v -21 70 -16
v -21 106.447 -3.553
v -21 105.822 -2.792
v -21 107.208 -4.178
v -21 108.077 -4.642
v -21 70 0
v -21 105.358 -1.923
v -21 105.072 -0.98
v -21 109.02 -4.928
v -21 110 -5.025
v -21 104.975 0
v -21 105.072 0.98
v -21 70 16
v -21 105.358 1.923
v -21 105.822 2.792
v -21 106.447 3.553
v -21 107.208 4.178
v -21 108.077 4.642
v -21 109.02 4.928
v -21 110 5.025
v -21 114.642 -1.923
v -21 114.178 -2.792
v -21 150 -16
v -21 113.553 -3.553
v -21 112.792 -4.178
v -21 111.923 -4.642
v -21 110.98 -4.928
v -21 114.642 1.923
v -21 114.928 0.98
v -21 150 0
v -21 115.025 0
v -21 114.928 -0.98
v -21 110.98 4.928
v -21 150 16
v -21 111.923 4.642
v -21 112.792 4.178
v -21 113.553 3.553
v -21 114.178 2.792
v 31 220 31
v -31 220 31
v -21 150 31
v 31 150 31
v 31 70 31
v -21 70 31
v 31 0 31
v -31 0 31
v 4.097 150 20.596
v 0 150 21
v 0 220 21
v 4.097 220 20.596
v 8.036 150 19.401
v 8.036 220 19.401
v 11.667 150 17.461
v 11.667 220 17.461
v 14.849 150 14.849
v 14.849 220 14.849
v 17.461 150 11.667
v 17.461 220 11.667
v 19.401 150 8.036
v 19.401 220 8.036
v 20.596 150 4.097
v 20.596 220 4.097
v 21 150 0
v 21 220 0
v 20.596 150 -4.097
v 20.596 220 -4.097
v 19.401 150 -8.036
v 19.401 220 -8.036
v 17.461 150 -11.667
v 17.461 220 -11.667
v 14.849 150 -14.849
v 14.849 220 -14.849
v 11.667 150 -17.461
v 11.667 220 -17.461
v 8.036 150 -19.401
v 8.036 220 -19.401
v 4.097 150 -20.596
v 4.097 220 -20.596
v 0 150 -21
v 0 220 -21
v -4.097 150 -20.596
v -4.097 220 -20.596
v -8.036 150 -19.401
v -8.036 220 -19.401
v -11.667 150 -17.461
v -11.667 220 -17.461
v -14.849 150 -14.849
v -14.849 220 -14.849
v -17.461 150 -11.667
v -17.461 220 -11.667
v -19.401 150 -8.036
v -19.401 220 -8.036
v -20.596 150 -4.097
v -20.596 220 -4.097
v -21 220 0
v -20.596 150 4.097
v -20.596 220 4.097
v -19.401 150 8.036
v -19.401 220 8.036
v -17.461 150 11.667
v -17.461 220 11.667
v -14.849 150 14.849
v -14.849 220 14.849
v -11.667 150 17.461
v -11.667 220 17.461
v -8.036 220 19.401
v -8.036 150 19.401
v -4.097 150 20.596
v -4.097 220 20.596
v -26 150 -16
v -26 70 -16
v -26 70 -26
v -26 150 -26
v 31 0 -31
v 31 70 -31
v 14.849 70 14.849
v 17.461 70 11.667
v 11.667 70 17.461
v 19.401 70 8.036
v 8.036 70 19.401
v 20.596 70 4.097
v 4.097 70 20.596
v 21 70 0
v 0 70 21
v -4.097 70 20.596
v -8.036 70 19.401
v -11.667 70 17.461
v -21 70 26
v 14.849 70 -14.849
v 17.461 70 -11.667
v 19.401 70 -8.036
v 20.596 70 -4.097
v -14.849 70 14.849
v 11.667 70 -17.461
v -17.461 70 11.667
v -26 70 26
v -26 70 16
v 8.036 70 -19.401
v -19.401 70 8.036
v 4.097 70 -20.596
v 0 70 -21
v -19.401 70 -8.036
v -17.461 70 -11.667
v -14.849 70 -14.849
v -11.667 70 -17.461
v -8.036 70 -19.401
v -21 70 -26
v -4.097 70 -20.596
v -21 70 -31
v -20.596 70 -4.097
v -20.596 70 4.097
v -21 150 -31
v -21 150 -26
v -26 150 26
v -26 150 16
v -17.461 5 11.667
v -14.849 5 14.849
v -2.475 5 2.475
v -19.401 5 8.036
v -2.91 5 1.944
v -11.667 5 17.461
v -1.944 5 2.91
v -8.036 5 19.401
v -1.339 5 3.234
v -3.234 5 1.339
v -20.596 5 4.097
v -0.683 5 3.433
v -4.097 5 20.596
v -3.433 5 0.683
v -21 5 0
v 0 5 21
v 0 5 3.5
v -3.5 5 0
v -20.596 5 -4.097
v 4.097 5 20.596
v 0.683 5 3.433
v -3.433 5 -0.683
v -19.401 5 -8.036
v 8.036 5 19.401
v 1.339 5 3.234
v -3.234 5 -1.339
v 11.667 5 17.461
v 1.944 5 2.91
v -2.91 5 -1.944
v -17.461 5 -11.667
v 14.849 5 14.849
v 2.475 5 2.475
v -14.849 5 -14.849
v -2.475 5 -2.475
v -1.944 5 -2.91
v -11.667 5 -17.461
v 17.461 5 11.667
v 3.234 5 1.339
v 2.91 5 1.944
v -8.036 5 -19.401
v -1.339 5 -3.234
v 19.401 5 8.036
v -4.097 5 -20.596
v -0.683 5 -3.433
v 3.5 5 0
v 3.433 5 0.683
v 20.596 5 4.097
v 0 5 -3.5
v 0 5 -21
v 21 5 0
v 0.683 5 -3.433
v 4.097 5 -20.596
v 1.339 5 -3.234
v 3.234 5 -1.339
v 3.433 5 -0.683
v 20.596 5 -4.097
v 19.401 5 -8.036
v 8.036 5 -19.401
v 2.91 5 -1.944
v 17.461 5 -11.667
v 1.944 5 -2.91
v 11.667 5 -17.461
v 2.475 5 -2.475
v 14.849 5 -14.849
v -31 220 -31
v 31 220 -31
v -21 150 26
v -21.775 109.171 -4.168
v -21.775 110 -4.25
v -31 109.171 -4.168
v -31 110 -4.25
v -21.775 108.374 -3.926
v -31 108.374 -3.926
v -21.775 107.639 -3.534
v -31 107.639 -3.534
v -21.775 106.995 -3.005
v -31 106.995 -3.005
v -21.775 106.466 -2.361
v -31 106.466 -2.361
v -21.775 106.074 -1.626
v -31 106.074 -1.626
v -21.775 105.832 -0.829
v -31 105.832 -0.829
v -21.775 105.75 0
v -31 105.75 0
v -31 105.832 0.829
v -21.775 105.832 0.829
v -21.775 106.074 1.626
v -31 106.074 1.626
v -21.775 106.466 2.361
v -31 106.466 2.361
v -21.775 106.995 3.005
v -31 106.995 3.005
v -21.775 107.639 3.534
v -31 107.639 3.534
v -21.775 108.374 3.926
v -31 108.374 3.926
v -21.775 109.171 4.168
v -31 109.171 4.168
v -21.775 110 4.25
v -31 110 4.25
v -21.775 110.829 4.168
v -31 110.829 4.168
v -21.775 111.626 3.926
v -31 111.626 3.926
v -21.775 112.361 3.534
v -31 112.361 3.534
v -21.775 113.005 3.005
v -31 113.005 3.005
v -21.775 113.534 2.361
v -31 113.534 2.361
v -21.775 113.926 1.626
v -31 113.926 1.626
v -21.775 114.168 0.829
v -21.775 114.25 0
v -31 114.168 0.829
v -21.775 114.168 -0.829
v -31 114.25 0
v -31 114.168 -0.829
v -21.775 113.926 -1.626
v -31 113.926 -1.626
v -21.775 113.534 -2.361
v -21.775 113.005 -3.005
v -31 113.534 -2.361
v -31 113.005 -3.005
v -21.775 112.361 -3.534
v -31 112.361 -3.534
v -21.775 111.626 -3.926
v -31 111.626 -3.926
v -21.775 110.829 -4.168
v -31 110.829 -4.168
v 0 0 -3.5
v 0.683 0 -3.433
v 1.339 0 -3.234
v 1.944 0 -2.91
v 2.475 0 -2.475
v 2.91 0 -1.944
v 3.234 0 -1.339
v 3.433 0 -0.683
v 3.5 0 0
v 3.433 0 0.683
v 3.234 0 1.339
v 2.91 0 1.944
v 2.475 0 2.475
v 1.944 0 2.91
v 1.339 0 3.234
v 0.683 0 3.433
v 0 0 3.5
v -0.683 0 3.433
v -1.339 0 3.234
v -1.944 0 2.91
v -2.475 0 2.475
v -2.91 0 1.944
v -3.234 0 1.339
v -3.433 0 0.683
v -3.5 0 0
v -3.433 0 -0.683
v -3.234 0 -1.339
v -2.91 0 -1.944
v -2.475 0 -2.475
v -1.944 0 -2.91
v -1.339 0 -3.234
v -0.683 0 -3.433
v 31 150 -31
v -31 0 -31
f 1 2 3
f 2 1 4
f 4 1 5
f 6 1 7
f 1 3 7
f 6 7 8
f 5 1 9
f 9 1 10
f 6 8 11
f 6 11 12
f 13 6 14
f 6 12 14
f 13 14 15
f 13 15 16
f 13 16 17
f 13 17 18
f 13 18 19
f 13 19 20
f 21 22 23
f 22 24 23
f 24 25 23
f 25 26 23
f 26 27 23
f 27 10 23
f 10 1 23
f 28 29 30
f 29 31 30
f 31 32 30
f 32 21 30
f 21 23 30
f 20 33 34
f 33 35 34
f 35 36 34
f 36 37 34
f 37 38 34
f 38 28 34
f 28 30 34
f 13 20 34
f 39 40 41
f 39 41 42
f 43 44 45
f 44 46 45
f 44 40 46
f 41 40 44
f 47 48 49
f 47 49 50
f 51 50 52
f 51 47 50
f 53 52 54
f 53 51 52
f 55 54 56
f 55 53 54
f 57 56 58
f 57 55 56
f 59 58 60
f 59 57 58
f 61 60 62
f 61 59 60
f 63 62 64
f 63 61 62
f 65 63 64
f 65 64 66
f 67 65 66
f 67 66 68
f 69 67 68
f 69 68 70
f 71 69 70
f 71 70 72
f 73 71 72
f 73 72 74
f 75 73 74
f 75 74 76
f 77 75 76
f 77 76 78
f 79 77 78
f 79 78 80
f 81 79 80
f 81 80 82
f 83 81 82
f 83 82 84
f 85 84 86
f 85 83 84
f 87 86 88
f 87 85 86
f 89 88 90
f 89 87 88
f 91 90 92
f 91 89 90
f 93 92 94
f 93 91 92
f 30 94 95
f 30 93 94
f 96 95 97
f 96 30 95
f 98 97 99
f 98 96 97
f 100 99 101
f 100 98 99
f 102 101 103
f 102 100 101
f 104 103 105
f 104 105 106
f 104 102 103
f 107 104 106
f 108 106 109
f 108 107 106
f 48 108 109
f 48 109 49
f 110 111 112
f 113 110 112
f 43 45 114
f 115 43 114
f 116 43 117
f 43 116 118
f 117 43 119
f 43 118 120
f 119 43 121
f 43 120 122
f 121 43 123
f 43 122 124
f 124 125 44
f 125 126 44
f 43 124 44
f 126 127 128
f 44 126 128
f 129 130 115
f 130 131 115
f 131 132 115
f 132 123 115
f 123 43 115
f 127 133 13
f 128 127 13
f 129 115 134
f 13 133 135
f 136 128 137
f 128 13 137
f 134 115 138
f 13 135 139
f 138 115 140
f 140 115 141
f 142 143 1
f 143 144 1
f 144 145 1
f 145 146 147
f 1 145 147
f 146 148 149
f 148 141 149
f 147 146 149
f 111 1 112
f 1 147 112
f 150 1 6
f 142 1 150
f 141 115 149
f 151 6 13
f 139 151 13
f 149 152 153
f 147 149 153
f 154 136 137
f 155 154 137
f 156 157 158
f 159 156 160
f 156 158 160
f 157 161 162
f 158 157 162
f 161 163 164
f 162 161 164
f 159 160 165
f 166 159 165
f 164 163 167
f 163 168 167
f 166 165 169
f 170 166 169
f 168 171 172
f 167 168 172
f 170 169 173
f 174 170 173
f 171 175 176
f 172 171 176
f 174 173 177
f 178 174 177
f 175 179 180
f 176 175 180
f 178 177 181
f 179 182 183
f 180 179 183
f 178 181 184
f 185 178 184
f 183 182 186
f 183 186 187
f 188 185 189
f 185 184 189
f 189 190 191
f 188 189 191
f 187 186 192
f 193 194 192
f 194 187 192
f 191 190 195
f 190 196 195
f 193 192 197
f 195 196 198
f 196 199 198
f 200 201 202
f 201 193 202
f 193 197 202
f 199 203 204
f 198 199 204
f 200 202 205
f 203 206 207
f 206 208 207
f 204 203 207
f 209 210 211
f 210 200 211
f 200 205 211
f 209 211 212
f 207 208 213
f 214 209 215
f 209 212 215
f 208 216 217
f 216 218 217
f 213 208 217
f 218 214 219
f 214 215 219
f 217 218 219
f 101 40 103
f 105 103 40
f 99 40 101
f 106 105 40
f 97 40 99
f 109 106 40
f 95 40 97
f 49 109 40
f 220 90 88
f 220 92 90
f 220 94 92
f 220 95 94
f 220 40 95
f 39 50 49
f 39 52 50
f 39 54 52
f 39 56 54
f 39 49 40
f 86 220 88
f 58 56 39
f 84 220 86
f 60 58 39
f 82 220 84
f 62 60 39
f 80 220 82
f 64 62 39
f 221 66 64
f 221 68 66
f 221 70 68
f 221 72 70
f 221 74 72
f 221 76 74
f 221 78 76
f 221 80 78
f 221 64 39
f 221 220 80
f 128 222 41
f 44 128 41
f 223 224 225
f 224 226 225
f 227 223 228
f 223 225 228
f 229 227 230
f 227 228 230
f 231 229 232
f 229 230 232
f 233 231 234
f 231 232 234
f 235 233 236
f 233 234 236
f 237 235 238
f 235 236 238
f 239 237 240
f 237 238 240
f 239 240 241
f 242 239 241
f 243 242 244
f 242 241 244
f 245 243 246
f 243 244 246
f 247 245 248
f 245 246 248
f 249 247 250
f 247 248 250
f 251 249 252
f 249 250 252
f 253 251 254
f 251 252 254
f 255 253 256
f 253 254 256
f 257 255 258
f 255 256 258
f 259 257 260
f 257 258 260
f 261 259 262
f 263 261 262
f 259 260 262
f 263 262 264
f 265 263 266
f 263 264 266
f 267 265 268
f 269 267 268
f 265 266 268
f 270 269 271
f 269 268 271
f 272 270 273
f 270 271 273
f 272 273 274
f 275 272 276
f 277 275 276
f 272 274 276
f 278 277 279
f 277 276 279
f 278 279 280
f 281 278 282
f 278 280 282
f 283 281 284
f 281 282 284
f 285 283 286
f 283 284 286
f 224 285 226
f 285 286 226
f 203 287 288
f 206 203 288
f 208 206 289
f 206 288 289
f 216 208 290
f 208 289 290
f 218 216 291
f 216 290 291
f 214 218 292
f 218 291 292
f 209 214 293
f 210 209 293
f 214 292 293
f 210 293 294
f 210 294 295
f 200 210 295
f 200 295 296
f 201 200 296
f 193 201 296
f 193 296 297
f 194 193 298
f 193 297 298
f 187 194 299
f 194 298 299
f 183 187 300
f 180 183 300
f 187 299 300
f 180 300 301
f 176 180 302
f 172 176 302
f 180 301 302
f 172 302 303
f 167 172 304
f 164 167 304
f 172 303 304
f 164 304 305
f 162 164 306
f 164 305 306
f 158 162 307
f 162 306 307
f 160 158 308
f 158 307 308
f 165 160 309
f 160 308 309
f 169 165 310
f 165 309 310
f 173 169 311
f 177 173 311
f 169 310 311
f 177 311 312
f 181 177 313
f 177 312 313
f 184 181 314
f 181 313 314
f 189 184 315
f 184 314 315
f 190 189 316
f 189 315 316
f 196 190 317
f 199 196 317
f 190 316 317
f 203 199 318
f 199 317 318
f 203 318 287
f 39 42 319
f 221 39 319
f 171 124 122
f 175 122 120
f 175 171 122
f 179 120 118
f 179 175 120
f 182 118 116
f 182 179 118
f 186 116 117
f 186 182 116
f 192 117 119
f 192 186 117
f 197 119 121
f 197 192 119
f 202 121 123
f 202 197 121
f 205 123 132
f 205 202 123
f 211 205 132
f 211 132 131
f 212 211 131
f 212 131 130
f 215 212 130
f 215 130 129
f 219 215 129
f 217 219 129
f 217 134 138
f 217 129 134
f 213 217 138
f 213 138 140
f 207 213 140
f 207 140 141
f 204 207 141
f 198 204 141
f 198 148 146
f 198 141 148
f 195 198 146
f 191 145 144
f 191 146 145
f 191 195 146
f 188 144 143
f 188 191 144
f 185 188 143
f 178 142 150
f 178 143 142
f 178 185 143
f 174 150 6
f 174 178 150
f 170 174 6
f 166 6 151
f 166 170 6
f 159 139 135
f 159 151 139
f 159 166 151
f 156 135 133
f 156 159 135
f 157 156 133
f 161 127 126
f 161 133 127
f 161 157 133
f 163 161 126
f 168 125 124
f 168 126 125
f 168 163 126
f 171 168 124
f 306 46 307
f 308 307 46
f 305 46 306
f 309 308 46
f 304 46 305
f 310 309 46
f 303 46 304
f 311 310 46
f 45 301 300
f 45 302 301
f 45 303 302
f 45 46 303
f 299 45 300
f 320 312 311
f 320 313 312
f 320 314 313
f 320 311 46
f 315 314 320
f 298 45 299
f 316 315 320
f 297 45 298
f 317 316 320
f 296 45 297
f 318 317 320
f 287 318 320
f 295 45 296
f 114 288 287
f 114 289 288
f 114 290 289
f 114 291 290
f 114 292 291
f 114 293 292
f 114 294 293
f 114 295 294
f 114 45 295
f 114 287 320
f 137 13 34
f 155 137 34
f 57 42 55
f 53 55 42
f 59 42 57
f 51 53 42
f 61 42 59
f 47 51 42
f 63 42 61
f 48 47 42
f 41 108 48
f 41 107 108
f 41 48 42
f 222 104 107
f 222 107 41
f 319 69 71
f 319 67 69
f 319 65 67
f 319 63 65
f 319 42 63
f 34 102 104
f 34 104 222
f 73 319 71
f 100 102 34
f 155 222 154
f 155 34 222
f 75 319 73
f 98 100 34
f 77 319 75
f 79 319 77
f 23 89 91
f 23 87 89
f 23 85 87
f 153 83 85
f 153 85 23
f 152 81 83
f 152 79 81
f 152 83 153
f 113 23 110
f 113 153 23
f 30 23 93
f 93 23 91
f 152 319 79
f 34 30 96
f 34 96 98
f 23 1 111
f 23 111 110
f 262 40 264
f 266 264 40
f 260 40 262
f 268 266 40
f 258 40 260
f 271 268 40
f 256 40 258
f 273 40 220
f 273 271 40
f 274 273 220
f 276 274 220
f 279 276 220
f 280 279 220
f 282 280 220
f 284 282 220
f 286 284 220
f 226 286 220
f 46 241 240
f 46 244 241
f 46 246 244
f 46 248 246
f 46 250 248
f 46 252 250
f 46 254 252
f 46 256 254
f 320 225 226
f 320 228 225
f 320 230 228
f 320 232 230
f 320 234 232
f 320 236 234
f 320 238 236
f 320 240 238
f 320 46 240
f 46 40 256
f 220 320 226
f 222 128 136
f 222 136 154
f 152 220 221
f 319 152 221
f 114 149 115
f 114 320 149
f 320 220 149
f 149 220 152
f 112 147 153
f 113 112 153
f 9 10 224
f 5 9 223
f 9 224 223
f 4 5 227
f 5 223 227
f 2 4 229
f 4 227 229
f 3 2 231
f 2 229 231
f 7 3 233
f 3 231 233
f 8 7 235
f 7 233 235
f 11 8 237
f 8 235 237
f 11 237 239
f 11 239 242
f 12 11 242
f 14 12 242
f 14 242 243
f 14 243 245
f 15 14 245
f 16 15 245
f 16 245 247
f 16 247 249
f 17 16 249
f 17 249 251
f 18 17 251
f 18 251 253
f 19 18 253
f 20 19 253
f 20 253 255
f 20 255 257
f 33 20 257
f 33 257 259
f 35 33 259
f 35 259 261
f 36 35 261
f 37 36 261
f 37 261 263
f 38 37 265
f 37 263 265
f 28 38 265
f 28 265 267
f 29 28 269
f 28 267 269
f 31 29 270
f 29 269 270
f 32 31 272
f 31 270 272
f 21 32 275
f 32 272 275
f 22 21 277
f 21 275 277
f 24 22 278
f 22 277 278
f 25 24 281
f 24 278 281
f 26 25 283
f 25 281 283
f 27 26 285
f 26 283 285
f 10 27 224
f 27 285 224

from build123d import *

# Parameters (mm, degrees)
SKETCH_2_W                    = 62
SKETCH_2_H                    = 62
SKETCH_2_R                    = 21
EXTRUDE_2_DEPTH               = 220
SKETCH_4_R                    = 21
SKETCH_4_R_2                  = 3.5
EXTRUDE_3_DEPTH               = 5
CUT_EXTRUDE_1_DEPTH           = 40
HOLE_WIZARD_M10_1_D           = 8.5
HOLE_WIZARD_M10_1_CSINK_D     = 10.05
HOLE_WIZARD_M10_1_CSINK_ANGLE = 90
SKETCH_7_W                    = 10
SKETCH_7_H                    = 80
CUT_EXTRUDE_2_DEPTH           = 5
SKETCH_10_W                   = 10
SKETCH_10_H                   = 80
CUT_EXTRUDE_3_DEPTH           = 5


with BuildPart() as part:
    # 草图2 → 凸台-拉伸2 (new body)
    with BuildSketch(Plane(origin=(0, 0, 0), x_dir=(1, 0, 0), z_dir=(0, 1, 0))):
        Rectangle(SKETCH_2_W, SKETCH_2_H)
        with Locations(Location((0, 0, 0), (0, 0, 270))):
            Circle(SKETCH_2_R, mode=Mode.SUBTRACT)
    extrude(amount=EXTRUDE_2_DEPTH)

    # 草图4 → 凸台-拉伸3 (add)
    with BuildSketch(Plane.XZ):
        with Locations(Location((0, 0, 0), (0, 0, 270))):
            Circle(SKETCH_4_R)
        with Locations(Location((0, 0, 0), (0, 0, 270))):
            Circle(SKETCH_4_R_2, mode=Mode.SUBTRACT)
    extrude(amount=-EXTRUDE_3_DEPTH)

    # 草图3 → 切除-拉伸1 (cut, symmetric)
    with BuildSketch(Plane(origin=(0, 110, 0), x_dir=(1, 0, 0), z_dir=(0, 1, 0))):
        Polygon((-21, 0), (-21, 36.73556218), (47.200279586, 36.73556218), (47.200279586, -37.147800903), (-21, -37.147800903), align=None)
    extrude(amount=CUT_EXTRUDE_1_DEPTH, both=True, mode=Mode.SUBTRACT)

    # M10 螺纹孔1 (through all)
    with Locations(Plane(origin=(-21, 110, 0), x_dir=(0, 0, 1), z_dir=(1, 0, 0))):
        with Locations((0, 0)):
            CounterSinkHole(HOLE_WIZARD_M10_1_D / 2, HOLE_WIZARD_M10_1_CSINK_D / 2, counter_sink_angle=HOLE_WIZARD_M10_1_CSINK_ANGLE)

    # 草图7 → 切除-拉伸2 (cut)
    with BuildSketch(Plane(origin=(-21, 0, 0), x_dir=(0, 0, -1), z_dir=(1, 0, 0))):
        with Locations((21, 110)):
            Rectangle(SKETCH_7_W, SKETCH_7_H)
    extrude(amount=-CUT_EXTRUDE_2_DEPTH, mode=Mode.SUBTRACT)

    # 草图10 → 切除-拉伸3 (cut)
    with BuildSketch(Plane(origin=(-21, 0, 0), x_dir=(0, 0, -1), z_dir=(1, 0, 0))):
        with Locations((-21, 110)):
            Rectangle(SKETCH_10_W, SKETCH_10_H)
    extrude(amount=-CUT_EXTRUDE_3_DEPTH, mode=Mode.SUBTRACT)


solid = part.part
